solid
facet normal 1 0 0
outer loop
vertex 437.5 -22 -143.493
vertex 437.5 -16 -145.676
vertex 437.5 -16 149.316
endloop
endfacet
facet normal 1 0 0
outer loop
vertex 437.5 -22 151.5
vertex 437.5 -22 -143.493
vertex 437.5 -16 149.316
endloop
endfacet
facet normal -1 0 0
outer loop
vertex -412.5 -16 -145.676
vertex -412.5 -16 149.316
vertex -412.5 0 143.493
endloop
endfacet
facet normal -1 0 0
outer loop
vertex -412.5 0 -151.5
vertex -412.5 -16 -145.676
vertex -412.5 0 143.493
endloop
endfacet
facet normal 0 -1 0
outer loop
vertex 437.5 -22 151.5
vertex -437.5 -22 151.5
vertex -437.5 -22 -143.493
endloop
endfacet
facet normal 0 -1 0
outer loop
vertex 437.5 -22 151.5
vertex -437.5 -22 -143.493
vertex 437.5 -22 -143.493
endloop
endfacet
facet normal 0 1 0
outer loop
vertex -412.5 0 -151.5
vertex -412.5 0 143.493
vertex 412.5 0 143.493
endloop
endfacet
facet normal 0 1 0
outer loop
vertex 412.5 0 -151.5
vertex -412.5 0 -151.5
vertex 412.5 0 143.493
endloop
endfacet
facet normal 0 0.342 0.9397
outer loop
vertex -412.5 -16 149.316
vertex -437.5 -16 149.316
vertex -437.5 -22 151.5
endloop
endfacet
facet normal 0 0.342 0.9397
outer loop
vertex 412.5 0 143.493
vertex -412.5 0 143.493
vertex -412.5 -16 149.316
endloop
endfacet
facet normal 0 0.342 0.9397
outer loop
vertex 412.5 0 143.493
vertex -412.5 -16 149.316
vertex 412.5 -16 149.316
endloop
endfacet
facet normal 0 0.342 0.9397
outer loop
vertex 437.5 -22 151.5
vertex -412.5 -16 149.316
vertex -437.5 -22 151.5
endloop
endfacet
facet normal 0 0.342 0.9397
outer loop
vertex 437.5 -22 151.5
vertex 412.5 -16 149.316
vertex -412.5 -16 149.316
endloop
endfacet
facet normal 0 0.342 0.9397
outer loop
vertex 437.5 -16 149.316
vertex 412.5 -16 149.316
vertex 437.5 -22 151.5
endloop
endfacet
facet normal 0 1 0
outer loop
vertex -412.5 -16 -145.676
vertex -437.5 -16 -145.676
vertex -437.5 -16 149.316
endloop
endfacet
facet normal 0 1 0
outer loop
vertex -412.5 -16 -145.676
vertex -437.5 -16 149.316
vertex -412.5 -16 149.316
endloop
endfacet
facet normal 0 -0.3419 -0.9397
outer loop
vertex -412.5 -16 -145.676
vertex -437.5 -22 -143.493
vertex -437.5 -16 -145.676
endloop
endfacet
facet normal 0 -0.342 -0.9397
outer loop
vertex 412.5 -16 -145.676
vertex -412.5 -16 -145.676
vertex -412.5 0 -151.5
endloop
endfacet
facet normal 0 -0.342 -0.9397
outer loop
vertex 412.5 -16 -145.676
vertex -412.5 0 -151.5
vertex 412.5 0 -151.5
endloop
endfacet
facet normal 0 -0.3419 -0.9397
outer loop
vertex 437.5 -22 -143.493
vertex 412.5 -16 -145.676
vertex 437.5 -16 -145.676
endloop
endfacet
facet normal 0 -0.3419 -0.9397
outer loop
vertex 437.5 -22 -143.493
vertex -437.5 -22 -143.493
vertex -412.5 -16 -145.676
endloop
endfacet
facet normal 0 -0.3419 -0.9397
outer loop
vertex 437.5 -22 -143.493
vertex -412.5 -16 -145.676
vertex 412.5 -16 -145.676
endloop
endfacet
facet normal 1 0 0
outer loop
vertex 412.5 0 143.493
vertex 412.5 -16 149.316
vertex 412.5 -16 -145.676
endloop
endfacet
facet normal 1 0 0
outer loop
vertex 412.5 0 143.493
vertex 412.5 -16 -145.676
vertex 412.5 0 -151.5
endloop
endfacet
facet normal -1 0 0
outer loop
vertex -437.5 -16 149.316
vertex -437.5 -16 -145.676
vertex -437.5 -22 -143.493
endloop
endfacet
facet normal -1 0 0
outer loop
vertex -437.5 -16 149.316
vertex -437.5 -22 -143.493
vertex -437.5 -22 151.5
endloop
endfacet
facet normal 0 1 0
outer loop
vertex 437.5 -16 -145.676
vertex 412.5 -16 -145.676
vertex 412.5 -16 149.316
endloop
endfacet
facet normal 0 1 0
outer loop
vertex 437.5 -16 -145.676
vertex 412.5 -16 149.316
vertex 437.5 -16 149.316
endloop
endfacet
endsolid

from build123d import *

# Parameters (mm, degrees)
F0_W       = 875
F0_H       = 303
F1_DEPTH   = 22
F2_SIZE2   = 8.007335
F2_SIZE    = 21.99999
F2_2_SIZE2 = 8.007335
F2_2_SIZE  = 21.99999
F3_W       = 25
F3_H       = 16
F4_DEPTH   = 200


# Not quite as in the source:
# - a fillet or chamfer is up to 0.001 mm smaller than in the source, because OpenCascade refuses the exact size


with BuildPart() as f1:
    # F0 (on Front) → F1 (new body)
    with BuildSketch(Plane.XZ):
        Rectangle(F0_W, F0_H)
    extrude(amount=F1_DEPTH)

    # F2 (size 22 and 8.0073451539 in the source; OpenCascade refuses exactly that, so slightly less here)
    f2_edges = [f1.edges().sort_by_distance(p)[0] for p in [
        (0, -22, -151.5),
    ]]
    f2_side = f1.faces().sort_by_distance((0, -11, -151.5))[0]
    chamfer(f2_edges, length=F2_SIZE, length2=F2_SIZE2, reference=f2_side)

    # F2#2 (size 22 and 8.0073451539 in the source; OpenCascade refuses exactly that, so slightly less here)
    f2_2_edges = [f1.edges().sort_by_distance(p)[0] for p in [
        (0, 0, 151.5),
    ]]
    f2_2_side = f1.faces().sort_by_distance((0, -11, 151.5))[0]
    chamfer(f2_2_edges, length=F2_2_SIZE, length2=F2_2_SIZE2, reference=f2_2_side)

    # F3 (on Top) → F4 (cut, symmetric)
    with BuildSketch(Plane.XY):
        with Locations((425, -8)):
            Rectangle(F3_W, F3_H)
        with Locations((-425, -8)):
            Rectangle(F3_W, F3_H)
    extrude(amount=F4_DEPTH, both=True, mode=Mode.SUBTRACT)


solid = f1.part
